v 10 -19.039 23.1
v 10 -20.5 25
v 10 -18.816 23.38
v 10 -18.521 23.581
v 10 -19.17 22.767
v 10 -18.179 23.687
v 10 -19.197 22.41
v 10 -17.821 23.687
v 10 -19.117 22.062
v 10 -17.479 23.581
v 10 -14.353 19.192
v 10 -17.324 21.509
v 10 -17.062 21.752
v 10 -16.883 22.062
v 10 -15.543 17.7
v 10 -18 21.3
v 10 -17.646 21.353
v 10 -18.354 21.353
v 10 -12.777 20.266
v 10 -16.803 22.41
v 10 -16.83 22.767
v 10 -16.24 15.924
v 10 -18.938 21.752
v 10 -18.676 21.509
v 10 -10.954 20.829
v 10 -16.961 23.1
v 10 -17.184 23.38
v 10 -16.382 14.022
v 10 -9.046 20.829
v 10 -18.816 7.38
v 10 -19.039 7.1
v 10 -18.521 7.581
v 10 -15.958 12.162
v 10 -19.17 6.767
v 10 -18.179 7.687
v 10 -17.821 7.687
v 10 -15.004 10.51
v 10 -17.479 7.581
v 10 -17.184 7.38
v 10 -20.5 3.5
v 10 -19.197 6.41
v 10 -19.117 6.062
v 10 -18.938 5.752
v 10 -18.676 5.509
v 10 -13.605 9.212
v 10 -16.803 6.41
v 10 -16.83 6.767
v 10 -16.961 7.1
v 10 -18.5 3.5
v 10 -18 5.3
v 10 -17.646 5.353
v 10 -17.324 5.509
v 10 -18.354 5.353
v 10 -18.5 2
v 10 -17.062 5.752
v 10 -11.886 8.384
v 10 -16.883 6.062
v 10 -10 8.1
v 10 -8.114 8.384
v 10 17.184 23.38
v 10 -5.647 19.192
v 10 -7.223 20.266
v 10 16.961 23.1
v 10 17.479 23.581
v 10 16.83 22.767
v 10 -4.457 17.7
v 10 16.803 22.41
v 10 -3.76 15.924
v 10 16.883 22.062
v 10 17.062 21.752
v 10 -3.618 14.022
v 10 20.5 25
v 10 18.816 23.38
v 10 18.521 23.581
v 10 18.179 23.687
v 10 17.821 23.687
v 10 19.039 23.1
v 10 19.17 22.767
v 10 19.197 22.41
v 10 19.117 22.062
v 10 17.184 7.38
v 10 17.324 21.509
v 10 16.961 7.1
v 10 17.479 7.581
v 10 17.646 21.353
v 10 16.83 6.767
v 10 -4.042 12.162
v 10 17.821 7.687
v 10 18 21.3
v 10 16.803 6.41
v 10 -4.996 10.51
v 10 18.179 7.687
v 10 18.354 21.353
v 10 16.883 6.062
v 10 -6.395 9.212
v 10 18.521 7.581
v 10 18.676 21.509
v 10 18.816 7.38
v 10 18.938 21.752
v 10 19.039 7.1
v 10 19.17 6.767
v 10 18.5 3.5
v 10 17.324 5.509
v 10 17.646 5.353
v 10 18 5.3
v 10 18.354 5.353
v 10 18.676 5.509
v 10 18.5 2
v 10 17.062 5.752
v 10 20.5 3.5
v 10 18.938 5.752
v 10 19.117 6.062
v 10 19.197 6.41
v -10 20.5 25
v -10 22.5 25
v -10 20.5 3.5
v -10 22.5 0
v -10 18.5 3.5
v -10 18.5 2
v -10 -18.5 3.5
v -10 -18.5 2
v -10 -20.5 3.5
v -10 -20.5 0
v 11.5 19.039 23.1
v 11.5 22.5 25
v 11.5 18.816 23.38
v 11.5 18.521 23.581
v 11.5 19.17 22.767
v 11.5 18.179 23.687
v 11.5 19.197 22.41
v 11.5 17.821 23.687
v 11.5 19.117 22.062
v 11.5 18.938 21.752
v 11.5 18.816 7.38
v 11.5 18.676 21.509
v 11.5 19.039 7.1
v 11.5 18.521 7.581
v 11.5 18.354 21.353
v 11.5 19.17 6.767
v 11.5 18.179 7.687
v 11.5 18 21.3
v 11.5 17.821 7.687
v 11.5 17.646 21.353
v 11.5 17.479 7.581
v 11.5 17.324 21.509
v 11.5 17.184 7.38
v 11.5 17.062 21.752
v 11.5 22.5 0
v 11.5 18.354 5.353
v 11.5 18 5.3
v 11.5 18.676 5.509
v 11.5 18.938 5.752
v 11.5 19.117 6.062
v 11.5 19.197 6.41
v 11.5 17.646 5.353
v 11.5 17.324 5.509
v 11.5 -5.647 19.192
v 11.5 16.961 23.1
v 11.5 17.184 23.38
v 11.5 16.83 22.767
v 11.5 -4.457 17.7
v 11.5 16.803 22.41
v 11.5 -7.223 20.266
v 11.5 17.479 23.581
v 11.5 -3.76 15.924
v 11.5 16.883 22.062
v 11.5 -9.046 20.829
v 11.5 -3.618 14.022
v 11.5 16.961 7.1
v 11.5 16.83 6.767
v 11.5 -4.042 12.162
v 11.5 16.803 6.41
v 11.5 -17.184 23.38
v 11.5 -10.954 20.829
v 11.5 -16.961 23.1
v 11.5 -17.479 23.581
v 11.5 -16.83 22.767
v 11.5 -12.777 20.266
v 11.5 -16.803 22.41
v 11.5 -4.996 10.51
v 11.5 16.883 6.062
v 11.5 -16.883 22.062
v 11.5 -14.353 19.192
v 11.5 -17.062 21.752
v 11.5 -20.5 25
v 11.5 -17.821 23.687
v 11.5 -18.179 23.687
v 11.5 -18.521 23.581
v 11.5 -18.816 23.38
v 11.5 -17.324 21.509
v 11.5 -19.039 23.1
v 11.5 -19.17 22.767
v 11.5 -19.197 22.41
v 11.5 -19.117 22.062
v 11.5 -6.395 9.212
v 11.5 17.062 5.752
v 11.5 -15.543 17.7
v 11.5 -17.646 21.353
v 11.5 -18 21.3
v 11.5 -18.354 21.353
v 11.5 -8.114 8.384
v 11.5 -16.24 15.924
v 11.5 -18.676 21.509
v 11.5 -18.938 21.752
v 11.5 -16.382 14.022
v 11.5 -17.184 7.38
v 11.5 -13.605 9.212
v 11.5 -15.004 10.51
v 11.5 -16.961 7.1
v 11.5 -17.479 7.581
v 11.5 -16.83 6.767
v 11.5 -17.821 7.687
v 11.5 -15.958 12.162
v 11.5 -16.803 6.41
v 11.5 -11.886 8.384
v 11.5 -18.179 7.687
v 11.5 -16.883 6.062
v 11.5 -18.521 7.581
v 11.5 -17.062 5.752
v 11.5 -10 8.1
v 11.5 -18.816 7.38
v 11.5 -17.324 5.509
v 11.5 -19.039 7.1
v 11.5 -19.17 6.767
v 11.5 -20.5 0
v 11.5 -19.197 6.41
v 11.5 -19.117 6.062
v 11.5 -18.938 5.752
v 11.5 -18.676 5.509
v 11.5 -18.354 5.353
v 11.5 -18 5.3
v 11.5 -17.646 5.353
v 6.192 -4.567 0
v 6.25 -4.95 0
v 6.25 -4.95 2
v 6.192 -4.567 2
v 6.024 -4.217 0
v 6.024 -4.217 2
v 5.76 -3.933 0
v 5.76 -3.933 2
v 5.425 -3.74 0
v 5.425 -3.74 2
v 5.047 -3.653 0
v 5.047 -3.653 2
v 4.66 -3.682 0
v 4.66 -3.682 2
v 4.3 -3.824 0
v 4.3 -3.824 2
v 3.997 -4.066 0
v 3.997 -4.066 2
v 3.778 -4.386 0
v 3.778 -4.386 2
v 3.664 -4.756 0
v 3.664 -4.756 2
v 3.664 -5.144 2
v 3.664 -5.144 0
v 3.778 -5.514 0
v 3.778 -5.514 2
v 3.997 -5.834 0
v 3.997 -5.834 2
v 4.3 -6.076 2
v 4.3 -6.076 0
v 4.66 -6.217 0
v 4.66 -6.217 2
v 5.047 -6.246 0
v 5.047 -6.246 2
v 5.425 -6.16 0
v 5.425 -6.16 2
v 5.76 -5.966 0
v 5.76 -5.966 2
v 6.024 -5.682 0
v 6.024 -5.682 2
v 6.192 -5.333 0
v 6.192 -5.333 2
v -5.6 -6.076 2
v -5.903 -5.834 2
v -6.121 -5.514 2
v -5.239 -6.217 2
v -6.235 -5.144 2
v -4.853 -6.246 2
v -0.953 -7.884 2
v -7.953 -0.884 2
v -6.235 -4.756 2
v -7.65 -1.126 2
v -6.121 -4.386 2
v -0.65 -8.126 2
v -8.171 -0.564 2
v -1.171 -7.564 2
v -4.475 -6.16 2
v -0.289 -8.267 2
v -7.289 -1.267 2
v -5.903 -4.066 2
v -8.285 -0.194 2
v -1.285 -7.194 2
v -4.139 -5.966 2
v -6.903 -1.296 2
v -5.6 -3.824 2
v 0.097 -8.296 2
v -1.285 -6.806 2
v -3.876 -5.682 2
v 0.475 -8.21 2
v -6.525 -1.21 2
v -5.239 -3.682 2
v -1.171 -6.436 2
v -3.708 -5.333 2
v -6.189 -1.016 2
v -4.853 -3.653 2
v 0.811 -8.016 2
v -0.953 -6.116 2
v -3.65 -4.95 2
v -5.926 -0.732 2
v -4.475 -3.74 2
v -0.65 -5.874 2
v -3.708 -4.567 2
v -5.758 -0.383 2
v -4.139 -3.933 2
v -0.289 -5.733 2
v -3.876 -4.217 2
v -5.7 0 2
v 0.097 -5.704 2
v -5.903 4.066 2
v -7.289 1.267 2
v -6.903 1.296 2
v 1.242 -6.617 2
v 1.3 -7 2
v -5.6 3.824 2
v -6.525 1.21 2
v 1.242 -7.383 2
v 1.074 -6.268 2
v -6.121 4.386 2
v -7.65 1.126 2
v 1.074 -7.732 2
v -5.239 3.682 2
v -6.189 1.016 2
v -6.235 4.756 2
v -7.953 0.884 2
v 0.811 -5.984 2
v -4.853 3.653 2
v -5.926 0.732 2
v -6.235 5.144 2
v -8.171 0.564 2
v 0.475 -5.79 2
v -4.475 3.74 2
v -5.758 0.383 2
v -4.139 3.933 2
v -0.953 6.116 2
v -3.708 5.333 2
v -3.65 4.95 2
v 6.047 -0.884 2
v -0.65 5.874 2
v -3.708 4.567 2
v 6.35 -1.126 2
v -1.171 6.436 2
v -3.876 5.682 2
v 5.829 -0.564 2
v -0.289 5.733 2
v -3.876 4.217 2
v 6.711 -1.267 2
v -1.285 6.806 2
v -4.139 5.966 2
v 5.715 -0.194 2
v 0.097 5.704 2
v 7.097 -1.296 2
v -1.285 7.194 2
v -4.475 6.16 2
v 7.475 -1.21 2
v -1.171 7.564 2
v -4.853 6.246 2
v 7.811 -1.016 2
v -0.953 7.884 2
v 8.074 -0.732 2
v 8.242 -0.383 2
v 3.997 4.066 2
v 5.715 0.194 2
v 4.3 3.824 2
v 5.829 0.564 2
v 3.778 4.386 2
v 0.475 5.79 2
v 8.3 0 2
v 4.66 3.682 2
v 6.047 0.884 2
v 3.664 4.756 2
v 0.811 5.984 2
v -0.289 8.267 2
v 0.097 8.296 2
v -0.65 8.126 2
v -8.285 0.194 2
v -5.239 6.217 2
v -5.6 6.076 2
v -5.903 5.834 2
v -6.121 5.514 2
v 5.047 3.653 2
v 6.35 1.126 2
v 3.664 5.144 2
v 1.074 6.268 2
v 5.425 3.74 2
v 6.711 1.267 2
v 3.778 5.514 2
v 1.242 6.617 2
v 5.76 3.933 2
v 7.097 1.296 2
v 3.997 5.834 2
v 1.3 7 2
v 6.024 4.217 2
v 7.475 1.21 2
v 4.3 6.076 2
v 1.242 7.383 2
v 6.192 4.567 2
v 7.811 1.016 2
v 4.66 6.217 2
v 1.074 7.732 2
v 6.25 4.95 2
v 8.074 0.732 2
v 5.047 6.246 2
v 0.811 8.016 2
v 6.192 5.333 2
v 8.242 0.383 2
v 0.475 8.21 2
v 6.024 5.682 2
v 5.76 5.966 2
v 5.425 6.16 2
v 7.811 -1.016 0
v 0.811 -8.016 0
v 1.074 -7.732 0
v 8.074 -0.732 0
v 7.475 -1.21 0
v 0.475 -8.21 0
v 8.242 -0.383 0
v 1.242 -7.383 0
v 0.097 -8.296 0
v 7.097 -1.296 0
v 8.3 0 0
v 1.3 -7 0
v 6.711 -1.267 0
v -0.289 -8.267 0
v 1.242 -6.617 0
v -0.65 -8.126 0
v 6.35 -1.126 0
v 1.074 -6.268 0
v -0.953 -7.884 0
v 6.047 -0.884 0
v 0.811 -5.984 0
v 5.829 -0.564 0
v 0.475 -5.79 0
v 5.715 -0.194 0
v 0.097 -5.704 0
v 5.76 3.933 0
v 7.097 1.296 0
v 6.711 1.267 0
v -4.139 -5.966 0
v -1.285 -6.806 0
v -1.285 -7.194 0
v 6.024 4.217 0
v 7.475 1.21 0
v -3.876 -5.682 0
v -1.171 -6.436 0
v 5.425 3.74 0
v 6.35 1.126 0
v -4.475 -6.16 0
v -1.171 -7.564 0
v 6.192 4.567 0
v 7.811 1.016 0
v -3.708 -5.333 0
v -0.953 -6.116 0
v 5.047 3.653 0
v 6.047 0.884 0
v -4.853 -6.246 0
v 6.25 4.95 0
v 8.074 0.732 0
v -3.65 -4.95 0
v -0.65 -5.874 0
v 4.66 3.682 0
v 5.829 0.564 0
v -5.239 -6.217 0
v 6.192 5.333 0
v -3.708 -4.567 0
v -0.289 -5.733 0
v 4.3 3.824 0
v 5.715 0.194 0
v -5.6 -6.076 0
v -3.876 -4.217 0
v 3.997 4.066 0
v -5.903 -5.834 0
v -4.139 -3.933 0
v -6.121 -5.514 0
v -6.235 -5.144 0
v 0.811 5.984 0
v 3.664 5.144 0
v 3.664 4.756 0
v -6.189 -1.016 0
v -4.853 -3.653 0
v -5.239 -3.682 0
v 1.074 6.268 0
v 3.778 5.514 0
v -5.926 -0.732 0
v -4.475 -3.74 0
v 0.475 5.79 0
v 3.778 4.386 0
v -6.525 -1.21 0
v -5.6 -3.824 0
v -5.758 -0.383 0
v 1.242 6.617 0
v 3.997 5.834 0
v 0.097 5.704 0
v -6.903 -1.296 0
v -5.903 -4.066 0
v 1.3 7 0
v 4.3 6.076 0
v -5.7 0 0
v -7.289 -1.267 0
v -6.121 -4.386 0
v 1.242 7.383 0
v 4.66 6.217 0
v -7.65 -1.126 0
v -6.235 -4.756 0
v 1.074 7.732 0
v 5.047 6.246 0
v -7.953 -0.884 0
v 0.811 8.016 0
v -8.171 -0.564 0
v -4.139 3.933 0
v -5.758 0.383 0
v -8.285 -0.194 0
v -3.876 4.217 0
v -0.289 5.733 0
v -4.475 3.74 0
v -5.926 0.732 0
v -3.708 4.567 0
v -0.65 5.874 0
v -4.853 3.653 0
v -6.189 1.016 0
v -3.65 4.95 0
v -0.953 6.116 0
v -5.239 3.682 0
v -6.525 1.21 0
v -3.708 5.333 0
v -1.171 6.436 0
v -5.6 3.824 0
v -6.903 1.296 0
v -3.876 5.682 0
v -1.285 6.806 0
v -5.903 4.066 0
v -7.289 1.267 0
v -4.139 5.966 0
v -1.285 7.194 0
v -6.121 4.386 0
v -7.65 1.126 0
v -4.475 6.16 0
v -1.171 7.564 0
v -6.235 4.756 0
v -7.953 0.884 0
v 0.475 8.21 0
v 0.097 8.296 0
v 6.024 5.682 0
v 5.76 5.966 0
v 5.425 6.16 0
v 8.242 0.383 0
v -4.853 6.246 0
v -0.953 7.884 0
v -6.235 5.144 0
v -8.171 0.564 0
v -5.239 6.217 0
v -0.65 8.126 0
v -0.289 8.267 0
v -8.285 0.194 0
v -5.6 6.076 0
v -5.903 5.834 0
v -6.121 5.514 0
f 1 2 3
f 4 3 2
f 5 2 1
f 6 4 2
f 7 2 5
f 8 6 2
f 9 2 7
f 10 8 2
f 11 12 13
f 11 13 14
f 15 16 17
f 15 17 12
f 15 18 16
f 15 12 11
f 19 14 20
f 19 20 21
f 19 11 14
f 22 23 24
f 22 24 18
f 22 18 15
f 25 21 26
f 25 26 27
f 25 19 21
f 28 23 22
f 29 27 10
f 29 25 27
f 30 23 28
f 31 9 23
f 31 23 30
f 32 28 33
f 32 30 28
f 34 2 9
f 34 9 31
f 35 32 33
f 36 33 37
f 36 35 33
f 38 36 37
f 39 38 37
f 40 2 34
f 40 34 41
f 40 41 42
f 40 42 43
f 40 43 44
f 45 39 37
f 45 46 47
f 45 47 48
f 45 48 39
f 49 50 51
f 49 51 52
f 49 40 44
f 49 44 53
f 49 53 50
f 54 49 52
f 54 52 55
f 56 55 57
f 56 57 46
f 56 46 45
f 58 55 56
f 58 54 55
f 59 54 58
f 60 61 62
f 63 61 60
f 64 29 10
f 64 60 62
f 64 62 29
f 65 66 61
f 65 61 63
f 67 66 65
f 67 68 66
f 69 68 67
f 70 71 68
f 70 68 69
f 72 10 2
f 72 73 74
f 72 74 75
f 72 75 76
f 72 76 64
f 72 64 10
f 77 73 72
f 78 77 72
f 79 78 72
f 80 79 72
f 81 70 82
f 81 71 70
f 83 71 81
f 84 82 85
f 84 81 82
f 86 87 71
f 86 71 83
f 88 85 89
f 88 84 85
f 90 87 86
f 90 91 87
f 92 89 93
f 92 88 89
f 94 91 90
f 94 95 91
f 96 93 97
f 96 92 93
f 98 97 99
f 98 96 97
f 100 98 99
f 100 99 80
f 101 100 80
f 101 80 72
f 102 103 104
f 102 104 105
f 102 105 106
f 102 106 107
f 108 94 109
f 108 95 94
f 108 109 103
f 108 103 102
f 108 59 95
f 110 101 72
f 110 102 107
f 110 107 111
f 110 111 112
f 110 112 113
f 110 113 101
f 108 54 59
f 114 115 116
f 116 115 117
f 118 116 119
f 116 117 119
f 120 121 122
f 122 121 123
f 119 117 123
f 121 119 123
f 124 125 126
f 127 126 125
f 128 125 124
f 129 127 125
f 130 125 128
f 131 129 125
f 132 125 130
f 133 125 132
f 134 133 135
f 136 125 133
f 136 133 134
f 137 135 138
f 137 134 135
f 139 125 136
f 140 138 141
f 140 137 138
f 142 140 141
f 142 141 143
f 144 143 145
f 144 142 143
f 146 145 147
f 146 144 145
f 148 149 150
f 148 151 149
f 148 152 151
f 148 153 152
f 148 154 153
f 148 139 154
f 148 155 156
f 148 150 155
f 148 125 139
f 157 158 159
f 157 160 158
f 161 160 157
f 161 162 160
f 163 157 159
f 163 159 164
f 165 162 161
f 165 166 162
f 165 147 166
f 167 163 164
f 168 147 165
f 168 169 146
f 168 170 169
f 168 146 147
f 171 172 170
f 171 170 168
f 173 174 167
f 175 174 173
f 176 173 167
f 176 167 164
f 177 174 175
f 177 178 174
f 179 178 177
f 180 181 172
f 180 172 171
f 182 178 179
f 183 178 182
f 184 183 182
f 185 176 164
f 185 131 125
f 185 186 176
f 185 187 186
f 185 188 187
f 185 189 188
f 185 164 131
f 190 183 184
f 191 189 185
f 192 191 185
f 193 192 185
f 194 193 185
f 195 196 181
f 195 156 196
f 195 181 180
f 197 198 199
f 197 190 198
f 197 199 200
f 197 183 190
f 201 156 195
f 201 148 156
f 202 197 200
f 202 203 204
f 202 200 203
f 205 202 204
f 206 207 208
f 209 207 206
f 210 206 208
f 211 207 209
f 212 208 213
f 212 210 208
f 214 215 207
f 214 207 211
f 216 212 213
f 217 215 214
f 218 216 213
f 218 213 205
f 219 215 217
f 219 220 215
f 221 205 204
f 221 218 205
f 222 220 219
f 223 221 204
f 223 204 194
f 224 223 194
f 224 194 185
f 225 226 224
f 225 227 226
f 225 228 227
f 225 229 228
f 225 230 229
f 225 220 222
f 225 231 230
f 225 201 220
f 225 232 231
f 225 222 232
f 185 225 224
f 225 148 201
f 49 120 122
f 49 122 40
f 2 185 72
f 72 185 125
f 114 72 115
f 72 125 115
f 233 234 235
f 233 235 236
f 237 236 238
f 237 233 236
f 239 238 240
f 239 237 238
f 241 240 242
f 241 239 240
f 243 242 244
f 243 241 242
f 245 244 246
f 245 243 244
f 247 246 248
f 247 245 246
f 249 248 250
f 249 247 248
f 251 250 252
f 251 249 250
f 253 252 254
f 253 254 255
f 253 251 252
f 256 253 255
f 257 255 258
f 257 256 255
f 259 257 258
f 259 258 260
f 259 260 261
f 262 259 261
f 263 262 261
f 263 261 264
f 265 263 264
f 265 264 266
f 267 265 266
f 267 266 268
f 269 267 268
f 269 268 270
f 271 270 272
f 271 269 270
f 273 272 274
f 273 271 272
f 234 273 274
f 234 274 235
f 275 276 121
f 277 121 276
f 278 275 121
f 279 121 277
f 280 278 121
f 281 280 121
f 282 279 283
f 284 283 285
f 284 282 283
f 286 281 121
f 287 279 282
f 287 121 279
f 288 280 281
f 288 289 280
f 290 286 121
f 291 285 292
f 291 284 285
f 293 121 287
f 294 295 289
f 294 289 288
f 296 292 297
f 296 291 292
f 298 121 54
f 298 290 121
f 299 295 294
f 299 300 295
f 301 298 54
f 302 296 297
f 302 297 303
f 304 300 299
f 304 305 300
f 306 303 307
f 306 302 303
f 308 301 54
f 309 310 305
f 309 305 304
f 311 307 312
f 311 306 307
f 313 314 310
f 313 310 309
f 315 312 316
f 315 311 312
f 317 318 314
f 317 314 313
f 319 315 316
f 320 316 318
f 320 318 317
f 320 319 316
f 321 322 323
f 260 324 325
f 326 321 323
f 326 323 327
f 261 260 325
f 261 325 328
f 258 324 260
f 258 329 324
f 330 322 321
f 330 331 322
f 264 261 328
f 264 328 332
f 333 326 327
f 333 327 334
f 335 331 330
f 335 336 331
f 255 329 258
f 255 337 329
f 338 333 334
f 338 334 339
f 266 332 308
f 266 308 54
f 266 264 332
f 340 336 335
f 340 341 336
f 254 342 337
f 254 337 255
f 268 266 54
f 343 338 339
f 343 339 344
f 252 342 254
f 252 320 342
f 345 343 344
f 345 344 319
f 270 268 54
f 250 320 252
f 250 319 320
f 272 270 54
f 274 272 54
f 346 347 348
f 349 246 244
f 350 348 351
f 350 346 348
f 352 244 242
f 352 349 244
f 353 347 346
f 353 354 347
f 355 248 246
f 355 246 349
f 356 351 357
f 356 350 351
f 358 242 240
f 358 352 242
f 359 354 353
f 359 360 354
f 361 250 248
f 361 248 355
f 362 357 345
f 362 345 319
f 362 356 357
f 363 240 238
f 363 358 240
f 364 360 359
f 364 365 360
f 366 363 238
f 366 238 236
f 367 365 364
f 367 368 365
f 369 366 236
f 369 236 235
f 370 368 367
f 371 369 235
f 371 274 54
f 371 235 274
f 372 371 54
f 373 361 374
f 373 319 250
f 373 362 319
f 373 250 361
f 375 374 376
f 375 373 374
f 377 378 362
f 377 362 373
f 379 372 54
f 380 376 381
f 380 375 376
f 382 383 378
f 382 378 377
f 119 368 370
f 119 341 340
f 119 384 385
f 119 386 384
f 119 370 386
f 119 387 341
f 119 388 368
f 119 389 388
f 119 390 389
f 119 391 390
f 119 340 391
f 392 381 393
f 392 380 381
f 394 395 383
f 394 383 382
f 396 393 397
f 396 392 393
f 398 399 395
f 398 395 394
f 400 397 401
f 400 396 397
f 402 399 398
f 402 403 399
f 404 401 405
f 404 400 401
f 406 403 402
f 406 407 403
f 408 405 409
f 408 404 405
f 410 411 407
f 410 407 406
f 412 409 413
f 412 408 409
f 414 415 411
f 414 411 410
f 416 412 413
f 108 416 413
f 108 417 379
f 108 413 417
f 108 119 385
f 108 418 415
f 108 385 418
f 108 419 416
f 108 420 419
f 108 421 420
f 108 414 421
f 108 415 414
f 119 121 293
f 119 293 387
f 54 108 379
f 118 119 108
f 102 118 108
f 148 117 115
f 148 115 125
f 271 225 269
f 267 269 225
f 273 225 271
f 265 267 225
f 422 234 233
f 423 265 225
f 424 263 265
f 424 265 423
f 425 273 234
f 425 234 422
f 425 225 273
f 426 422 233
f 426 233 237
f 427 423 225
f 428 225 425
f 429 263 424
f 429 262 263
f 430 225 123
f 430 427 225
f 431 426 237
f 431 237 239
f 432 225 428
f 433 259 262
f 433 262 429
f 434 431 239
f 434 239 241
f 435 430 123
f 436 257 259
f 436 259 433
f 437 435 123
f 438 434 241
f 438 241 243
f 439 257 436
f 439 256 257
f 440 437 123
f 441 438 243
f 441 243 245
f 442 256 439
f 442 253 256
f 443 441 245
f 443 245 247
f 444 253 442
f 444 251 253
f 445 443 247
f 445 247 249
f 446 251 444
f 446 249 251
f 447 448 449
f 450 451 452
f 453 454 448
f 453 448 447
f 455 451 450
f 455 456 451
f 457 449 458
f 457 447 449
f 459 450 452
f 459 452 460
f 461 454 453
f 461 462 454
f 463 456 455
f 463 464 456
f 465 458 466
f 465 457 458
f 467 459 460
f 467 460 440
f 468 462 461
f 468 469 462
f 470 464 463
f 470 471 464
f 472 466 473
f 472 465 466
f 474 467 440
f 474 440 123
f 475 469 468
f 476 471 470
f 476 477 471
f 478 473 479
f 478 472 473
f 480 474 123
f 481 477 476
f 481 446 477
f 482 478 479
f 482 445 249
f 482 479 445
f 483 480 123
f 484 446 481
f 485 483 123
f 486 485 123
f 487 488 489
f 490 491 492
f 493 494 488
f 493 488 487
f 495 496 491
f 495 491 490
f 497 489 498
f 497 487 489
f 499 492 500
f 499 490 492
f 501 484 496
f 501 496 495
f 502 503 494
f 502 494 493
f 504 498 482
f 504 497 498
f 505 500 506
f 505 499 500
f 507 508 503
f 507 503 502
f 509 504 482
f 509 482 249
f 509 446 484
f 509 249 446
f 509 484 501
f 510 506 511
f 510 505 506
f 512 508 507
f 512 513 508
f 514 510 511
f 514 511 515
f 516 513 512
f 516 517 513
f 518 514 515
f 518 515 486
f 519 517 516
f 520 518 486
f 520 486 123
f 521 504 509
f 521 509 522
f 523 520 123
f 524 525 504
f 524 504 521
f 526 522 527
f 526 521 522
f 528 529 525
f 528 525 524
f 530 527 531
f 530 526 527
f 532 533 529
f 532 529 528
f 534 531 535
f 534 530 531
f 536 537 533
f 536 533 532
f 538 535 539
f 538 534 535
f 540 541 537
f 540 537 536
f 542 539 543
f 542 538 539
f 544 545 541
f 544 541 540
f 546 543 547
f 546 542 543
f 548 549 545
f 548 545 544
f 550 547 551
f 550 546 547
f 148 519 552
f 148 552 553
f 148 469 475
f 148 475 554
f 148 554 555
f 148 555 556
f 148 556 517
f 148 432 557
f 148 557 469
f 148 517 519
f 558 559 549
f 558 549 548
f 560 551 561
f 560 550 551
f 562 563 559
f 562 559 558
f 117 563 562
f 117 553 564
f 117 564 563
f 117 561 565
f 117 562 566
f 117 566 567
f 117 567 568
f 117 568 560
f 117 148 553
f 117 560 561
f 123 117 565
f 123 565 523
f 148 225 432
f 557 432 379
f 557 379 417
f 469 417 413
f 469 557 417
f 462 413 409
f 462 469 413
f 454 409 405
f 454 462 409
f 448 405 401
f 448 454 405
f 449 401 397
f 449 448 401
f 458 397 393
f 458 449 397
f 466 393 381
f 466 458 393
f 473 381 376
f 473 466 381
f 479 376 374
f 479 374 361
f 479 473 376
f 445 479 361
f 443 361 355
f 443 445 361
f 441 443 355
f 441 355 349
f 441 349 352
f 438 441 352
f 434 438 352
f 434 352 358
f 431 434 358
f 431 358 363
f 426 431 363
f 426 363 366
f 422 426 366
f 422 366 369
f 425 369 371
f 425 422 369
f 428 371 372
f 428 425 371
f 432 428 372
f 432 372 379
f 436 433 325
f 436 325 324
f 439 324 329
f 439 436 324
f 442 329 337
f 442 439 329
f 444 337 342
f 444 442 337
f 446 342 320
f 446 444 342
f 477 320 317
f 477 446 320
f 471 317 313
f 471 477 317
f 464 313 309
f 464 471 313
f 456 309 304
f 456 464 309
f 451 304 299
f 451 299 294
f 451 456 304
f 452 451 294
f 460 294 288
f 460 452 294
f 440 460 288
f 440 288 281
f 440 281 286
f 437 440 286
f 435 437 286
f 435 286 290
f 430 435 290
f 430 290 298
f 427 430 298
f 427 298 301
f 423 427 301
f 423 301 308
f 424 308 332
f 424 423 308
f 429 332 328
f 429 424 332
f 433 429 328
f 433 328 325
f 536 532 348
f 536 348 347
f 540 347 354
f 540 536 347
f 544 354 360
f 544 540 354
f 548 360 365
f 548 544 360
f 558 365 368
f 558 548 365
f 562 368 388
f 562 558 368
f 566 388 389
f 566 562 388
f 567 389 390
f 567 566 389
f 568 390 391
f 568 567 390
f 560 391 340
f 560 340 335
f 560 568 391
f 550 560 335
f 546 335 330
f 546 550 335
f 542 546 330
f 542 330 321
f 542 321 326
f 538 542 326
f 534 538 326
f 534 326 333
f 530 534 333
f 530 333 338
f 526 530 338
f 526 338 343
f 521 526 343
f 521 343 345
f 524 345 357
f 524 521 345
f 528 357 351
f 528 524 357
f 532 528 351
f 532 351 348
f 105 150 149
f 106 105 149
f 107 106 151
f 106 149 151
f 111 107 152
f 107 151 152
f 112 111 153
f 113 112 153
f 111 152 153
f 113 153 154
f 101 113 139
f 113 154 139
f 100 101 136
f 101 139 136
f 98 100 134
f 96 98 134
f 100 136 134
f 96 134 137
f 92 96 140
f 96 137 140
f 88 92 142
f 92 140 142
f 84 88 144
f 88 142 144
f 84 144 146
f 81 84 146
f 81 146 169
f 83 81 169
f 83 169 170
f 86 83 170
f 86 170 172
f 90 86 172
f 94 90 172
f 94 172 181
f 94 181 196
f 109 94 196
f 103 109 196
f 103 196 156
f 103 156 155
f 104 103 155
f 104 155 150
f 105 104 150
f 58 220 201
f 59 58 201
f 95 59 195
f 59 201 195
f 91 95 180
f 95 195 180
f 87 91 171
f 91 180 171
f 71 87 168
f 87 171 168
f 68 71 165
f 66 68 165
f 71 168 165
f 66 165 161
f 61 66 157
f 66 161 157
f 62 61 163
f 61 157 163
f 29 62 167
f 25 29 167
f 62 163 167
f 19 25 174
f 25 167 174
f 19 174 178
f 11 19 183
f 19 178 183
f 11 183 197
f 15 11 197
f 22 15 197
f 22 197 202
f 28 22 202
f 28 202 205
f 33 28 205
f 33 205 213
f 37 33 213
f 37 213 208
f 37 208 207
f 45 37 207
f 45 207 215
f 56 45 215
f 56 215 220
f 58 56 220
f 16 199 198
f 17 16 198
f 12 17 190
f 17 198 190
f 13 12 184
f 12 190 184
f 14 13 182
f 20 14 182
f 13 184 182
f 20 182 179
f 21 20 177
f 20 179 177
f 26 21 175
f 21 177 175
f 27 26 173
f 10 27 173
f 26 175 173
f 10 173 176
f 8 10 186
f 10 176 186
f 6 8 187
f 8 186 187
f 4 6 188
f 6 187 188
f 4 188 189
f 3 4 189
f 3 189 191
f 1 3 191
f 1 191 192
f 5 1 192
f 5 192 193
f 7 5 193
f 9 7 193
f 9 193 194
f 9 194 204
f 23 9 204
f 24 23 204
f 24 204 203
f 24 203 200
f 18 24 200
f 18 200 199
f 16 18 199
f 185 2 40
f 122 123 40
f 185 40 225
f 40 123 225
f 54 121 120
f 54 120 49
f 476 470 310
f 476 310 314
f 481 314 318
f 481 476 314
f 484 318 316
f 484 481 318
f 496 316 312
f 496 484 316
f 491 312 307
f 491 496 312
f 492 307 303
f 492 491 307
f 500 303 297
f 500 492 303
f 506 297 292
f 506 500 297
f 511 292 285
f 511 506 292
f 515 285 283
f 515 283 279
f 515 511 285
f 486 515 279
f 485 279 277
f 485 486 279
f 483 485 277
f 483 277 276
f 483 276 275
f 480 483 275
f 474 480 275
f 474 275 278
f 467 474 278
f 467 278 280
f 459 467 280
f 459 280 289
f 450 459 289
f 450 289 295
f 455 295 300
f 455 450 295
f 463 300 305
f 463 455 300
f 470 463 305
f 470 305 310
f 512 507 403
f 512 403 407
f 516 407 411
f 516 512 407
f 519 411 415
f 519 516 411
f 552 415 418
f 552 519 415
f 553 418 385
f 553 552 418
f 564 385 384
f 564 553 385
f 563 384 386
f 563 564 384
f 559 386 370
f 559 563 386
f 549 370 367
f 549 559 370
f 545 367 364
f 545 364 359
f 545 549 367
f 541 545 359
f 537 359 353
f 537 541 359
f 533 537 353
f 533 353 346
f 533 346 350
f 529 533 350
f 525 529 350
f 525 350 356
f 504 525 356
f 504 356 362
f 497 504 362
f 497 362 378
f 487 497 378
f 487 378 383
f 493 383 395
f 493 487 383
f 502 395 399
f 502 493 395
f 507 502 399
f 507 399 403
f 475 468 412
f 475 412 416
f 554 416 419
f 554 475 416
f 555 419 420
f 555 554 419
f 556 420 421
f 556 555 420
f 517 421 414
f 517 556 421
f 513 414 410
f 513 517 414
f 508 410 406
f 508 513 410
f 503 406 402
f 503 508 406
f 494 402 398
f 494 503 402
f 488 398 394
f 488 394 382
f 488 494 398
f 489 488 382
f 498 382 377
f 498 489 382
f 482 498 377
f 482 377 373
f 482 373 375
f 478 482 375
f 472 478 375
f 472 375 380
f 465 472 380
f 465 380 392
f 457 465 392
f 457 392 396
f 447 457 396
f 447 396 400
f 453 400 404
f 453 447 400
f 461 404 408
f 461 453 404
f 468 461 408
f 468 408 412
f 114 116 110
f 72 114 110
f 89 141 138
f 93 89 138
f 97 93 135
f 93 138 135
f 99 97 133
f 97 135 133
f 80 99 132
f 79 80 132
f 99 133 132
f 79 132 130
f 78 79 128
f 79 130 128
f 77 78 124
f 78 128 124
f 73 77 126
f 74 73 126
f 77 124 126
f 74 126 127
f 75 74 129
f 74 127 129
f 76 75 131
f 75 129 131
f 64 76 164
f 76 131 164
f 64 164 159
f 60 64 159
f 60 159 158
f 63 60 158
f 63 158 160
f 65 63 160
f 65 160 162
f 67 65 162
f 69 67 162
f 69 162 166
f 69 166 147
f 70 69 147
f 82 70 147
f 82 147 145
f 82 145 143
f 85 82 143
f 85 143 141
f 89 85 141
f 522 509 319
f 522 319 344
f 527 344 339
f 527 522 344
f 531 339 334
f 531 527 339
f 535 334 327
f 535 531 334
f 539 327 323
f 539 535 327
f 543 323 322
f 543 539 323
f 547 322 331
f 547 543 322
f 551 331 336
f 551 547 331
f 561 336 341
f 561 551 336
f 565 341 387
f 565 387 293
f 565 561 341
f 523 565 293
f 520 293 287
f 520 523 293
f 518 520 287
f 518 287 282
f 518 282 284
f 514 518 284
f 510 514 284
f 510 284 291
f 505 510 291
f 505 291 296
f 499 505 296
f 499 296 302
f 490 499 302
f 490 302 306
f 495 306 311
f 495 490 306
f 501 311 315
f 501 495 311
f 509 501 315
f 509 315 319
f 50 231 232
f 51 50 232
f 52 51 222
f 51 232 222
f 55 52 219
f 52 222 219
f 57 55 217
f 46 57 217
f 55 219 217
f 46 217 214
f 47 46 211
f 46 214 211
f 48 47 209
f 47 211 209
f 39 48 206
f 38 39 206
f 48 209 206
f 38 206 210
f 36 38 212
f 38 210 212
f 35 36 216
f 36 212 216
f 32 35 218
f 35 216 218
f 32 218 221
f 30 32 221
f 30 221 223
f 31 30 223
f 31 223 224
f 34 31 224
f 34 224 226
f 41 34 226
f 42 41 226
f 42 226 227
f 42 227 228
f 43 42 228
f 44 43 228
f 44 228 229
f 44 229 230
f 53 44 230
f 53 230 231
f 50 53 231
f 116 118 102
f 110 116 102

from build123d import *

# Parameters (mm, degrees)
SKETCH_1_W          = 20
SKETCH_1_H          = 41
SKETCH_1_R          = 1.3
EXTRUDE_1_DEPTH     = 2
SKETCH_1_3_W        = 1.5
SKETCH_1_3_H        = 41
EXTRUDE_2_DEPTH     = 25
SKETCH_2_R          = 1.2
SKETCH_2_R_2        = 6.4
CUT_EXTRUDE_1_DEPTH = 39.826537317
EXTRUDE_6_DEPTH     = 25
SKETCH_4_W          = 20
SKETCH_4_H          = 2
EXTRUDE_8_DEPTH     = 1.5


with BuildPart() as part:
    # 草圖1 → 填料-伸長1 (new body)
    with BuildSketch(Plane.XY):
        Rectangle(SKETCH_1_W, SKETCH_1_H)
        with Locations((-4.949747468, -4.949747468)):
            Circle(SKETCH_1_R, mode=Mode.SUBTRACT)
        with Locations((-7, 0)):
            Circle(SKETCH_1_R, mode=Mode.SUBTRACT)
        with Locations((0, -7)):
            Circle(SKETCH_1_R, mode=Mode.SUBTRACT)
        with Locations((4.949747468, -4.949747468)):
            Circle(SKETCH_1_R, mode=Mode.SUBTRACT)
        with Locations((7, 0)):
            Circle(SKETCH_1_R, mode=Mode.SUBTRACT)
        with Locations((-4.949747468, 4.949747468)):
            Circle(SKETCH_1_R, mode=Mode.SUBTRACT)
        with Locations((0, 7)):
            Circle(SKETCH_1_R, mode=Mode.SUBTRACT)
        with Locations((4.949747468, 4.949747468)):
            Circle(SKETCH_1_R, mode=Mode.SUBTRACT)
    extrude(amount=EXTRUDE_1_DEPTH)

    # 草圖1<3> → 填料-伸長2 (add)
    with BuildSketch(Plane.XY):
        with Locations((10.75, 0)):
            Rectangle(SKETCH_1_3_W, SKETCH_1_3_H)
    extrude(amount=EXTRUDE_2_DEPTH)

    # 草圖2 → 除料-伸長1 (cut, through all)
    with BuildSketch(Plane(origin=(11.5, 0, 0), x_dir=(0, 0, -1), z_dir=(1, 0, 0))):
        with Locations((-22.5, -18)):
            Circle(SKETCH_2_R)
        with Locations((-22.5, 18)):
            Circle(SKETCH_2_R)
        with Locations((-6.5, 18)):
            Circle(SKETCH_2_R)
        with Locations((-6.5, -18)):
            Circle(SKETCH_2_R)
        with Locations((-14.5, -10)):
            Circle(SKETCH_2_R_2)
    extrude(amount=-CUT_EXTRUDE_1_DEPTH, mode=Mode.SUBTRACT)

    # 草圖1<6> → 填料-伸長6 (add)
    with BuildSketch(Plane.XY):
        Polygon((-10, 22.5), (-10, 20.5), (10, 20.5), (11.5, 20.5), (11.5, 22.5), align=None)
    extrude(amount=EXTRUDE_6_DEPTH)

    # 草圖4 → 填料-伸長8 (add)
    with BuildSketch(Plane.XY.offset(2)):
        with Locations((0, -19.5)):
            Rectangle(SKETCH_4_W, SKETCH_4_H)
    extrude_8 = extrude(amount=EXTRUDE_8_DEPTH)

    # 鏡射1: 填料-伸長8 across plane
    add(extrude_8.mirror(Plane.ZX))


solid = part.part
